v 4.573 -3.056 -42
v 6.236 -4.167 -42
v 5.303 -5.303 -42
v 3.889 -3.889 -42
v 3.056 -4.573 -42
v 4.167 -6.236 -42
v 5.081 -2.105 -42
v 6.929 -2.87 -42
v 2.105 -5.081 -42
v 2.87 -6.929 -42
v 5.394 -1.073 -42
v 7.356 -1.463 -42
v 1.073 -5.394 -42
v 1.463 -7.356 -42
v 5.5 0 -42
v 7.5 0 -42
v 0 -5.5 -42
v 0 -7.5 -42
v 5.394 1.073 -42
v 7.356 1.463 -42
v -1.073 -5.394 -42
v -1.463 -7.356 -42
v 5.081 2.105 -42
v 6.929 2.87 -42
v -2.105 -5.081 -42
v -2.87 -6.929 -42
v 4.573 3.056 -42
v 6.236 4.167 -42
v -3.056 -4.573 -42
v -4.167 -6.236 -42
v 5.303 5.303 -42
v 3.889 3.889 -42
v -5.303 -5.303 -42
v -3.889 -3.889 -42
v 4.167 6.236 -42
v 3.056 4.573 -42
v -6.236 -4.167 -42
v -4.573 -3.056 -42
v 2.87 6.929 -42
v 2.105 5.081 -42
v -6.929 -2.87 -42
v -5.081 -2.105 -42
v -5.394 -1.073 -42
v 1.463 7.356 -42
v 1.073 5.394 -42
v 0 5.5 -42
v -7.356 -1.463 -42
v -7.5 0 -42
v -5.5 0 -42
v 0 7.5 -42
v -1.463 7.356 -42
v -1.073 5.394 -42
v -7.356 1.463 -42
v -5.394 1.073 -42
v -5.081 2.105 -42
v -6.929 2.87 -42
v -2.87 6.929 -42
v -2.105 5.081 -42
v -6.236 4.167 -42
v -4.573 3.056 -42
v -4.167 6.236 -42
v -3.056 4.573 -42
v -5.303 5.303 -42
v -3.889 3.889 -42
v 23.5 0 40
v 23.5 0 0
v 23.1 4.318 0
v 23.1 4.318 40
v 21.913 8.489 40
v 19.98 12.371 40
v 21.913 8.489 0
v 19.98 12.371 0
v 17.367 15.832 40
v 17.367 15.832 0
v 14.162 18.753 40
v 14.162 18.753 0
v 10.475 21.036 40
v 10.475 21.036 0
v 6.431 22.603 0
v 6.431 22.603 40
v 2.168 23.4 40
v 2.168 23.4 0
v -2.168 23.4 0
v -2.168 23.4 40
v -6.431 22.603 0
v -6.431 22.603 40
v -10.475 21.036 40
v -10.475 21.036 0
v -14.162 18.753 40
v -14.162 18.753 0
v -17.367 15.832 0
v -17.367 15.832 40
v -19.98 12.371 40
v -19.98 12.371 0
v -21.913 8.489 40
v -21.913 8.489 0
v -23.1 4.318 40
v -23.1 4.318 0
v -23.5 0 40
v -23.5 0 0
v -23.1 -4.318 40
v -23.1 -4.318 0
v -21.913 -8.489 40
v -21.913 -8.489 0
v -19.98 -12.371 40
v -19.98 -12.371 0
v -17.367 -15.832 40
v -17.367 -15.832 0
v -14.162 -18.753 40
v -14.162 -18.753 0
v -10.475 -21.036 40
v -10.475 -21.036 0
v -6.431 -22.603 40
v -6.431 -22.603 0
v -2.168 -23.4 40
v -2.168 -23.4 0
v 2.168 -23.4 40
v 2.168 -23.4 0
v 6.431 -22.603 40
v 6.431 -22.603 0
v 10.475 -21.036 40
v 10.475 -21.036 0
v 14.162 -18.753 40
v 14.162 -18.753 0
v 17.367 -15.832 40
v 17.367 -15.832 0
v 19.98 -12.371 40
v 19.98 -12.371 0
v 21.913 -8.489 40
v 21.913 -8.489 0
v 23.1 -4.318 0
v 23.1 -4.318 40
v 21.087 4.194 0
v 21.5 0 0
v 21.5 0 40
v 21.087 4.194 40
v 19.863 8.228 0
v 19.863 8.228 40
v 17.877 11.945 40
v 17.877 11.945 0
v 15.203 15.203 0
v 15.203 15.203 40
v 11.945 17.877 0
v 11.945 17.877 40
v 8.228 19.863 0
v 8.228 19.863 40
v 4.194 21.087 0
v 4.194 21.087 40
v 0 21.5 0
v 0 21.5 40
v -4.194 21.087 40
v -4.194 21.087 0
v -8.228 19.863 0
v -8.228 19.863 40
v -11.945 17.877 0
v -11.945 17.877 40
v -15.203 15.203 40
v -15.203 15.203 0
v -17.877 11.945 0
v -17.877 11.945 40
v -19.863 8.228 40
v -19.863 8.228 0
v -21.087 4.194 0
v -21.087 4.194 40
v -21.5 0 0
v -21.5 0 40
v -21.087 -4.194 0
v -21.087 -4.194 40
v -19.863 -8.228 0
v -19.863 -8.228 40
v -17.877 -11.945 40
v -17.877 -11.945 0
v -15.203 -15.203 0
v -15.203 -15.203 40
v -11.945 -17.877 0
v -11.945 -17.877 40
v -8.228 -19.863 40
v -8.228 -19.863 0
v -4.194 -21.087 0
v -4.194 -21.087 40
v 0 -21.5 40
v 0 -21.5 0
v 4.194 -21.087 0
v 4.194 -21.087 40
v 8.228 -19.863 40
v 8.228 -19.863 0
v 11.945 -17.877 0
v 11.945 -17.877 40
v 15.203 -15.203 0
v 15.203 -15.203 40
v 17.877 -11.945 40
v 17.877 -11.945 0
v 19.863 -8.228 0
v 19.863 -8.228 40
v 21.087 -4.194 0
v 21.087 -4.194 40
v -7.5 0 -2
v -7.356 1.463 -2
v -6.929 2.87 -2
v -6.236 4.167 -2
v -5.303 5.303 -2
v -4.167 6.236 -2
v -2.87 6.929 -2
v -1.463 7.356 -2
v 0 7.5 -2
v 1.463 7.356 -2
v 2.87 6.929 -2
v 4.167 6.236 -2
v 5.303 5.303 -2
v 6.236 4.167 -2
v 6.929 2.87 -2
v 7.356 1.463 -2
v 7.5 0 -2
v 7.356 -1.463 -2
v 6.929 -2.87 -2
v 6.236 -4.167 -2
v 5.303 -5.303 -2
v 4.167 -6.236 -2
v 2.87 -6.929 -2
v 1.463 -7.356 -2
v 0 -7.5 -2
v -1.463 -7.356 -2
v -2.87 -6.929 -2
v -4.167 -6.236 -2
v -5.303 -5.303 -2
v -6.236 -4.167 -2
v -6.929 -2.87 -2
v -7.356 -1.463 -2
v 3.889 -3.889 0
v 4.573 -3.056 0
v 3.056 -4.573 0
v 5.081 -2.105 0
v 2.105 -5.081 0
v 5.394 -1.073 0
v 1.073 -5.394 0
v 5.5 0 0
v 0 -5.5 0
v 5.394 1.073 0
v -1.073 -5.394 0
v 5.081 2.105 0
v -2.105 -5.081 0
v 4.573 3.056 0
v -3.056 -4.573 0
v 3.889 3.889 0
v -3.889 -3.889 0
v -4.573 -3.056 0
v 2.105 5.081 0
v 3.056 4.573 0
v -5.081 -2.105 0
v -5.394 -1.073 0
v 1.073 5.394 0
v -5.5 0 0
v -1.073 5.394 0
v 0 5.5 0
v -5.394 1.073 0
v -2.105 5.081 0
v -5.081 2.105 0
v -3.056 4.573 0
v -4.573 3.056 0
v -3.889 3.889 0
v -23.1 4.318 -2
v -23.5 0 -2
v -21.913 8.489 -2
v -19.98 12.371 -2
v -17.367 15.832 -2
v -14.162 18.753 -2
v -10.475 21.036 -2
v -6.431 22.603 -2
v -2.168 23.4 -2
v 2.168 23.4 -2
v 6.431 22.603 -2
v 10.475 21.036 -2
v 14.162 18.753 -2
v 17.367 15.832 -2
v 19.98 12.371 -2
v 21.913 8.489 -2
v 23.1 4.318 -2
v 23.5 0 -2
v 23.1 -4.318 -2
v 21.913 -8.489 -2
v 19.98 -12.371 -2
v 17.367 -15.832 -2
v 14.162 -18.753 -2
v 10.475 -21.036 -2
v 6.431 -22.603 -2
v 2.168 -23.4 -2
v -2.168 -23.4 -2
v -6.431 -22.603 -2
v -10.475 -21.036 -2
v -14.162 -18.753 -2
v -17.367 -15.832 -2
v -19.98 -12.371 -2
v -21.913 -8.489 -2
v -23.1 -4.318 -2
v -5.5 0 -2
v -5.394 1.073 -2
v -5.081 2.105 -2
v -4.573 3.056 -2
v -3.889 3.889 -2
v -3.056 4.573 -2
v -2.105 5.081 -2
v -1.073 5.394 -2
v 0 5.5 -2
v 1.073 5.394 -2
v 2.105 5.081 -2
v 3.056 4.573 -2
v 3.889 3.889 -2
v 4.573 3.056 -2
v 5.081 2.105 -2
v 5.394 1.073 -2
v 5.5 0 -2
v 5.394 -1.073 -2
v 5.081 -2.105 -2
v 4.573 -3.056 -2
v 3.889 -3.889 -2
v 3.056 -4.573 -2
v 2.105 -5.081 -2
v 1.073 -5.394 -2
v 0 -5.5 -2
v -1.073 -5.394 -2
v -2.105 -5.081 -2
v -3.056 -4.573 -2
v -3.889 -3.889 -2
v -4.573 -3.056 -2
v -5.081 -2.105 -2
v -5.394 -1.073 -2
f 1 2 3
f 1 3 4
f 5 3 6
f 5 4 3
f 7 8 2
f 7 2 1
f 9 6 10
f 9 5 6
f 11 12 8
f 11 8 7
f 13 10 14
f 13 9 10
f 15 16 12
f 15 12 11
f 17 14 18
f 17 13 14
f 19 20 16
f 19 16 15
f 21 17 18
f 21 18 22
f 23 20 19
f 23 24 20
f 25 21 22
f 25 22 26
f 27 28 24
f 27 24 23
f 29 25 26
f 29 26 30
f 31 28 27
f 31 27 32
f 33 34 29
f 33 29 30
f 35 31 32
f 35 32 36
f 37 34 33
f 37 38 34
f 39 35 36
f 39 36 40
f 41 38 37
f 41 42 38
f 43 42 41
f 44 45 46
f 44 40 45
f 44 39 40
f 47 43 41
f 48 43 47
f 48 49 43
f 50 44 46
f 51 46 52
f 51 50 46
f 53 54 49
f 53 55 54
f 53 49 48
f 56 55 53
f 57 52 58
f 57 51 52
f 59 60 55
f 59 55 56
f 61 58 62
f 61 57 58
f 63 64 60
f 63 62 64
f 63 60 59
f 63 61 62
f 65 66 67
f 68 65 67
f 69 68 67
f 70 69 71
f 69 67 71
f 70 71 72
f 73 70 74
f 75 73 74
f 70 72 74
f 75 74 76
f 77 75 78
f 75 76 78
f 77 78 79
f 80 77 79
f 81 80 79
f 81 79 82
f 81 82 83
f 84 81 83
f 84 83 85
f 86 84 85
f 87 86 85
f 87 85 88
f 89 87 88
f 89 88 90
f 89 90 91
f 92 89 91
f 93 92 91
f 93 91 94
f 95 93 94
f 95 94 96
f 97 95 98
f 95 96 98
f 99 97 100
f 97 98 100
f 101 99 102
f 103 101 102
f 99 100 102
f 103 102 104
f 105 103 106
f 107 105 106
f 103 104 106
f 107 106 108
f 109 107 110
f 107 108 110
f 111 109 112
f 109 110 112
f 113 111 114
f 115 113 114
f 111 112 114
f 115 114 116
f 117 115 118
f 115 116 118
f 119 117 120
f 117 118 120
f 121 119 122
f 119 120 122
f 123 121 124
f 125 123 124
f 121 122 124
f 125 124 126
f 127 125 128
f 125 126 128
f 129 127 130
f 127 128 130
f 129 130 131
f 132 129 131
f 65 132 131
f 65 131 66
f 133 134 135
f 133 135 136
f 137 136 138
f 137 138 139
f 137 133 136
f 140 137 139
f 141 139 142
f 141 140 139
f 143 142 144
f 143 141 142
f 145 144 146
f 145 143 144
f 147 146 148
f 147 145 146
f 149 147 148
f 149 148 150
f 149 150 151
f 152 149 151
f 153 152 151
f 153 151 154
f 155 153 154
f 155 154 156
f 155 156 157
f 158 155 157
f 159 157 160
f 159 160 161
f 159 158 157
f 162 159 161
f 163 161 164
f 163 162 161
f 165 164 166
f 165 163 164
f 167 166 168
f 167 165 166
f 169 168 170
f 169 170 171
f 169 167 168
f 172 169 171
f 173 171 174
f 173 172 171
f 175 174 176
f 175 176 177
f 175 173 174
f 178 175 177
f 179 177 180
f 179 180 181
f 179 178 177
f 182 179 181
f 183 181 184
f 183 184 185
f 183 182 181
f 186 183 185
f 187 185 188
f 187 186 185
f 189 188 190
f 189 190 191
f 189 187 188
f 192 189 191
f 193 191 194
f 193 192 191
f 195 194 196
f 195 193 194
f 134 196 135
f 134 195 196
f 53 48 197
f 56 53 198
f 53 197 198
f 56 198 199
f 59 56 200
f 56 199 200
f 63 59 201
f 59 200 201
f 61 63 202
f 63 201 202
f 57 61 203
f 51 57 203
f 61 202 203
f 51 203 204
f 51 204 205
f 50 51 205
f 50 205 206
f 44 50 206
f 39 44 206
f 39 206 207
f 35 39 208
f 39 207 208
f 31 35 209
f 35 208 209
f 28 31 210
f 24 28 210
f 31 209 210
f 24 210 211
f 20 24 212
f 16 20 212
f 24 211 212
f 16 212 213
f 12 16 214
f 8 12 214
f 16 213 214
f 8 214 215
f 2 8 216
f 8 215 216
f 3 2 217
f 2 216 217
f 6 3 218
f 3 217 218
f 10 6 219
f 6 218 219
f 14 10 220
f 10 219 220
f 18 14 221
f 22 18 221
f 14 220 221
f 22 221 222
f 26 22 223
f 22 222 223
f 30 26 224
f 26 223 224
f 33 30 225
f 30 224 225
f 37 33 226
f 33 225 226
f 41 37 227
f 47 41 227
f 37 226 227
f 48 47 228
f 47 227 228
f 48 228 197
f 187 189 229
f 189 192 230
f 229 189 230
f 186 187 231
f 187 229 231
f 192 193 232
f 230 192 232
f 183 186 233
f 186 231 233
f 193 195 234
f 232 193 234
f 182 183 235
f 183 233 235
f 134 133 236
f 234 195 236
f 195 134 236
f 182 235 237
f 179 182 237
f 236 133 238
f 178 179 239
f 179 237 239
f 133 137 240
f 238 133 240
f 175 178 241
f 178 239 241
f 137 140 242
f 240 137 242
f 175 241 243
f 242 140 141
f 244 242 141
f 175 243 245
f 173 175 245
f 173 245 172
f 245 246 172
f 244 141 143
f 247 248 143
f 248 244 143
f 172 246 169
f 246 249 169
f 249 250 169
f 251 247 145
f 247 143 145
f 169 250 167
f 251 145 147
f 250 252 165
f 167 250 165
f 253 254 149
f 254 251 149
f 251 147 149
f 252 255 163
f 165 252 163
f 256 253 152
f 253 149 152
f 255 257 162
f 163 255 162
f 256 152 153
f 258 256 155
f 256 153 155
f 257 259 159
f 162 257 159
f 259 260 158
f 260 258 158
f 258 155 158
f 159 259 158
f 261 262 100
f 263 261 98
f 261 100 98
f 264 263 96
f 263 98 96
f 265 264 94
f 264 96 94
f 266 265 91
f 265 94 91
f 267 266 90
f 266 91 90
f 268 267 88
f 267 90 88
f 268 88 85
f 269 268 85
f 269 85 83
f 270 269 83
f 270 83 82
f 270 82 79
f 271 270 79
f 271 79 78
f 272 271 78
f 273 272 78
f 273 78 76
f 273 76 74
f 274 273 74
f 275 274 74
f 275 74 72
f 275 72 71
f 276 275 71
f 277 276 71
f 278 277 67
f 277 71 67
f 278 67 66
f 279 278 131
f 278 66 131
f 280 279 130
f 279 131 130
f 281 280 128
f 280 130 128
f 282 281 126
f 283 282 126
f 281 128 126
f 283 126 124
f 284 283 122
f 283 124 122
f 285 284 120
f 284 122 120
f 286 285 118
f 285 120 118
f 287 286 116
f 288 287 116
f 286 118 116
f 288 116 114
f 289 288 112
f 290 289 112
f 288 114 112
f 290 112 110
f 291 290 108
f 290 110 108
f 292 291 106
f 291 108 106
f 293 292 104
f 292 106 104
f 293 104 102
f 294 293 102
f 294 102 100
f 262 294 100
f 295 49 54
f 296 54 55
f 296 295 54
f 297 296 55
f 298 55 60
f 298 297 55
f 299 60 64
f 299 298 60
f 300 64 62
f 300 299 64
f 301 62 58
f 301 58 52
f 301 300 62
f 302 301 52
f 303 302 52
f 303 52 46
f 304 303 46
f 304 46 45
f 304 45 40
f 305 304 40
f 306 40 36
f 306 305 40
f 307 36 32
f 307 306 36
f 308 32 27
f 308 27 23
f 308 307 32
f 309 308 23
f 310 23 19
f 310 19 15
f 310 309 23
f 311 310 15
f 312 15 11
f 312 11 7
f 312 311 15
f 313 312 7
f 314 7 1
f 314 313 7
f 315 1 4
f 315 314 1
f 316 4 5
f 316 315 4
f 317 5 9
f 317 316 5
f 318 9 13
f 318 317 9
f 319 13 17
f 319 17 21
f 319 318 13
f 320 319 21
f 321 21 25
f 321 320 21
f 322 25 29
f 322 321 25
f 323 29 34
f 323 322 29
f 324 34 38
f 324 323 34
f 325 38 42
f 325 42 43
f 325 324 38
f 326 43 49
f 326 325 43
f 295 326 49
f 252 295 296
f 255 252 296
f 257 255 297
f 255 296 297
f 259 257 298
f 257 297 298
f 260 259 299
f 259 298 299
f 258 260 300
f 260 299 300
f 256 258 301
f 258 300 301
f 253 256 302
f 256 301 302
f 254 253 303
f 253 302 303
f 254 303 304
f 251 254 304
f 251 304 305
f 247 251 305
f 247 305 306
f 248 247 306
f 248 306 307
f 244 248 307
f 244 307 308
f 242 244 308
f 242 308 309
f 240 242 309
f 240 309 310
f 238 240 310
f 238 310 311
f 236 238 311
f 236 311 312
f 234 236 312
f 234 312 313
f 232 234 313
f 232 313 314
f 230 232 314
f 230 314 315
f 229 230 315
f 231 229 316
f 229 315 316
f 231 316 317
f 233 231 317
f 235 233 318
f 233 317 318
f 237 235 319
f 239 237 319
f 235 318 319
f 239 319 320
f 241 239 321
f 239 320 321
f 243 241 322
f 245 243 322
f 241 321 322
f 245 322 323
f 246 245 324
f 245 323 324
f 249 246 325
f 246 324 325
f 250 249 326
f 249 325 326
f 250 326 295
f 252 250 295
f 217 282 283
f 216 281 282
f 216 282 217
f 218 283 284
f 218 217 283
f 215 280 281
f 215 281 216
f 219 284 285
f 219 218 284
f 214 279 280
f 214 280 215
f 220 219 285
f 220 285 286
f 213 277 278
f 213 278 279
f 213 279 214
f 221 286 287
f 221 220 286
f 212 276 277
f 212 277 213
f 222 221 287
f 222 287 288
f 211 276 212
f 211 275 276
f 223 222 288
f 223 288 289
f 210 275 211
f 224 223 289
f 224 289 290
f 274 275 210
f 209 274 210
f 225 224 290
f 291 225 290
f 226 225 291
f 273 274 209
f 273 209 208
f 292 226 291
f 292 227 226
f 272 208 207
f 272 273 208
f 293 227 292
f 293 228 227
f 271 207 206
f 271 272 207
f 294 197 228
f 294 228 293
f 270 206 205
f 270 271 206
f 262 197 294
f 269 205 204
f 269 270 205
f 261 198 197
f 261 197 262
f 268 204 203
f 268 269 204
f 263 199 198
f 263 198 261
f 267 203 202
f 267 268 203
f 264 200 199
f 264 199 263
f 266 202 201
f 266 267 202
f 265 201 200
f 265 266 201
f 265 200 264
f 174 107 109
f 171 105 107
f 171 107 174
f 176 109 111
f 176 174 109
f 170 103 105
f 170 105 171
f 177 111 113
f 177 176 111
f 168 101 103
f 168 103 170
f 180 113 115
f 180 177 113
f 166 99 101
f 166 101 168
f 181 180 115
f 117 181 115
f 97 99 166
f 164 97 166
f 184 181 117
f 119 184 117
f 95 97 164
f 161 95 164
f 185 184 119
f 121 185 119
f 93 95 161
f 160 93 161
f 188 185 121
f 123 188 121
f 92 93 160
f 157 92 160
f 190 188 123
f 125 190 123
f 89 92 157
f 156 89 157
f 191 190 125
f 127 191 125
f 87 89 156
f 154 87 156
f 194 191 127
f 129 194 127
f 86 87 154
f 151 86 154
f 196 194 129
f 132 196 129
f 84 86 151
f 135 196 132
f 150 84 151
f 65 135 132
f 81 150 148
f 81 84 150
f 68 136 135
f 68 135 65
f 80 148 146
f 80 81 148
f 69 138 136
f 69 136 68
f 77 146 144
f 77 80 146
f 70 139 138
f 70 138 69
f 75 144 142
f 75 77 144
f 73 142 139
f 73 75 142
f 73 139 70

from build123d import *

# Parameters (mm, degrees)
SKETCH1_R               = 23.5
SKETCH1_R_2             = 21.5
BOSS_EXTRUDE1_DEPTH     = 40
SKETCH3_R               = 23.5
BOSS_EXTRUDE4_DEPTH     = 2
SKETCH4_R               = 7.5
SKETCH4_R_2             = 5.5
BOSS_EXTRUDE5_DEPTH     = 40
SKETCH5_R               = 5.5
CUT_EXTRUDE1_DEPTH      = 41
CUT_EXTRUDE1_DEPTH_BACK = 43


with BuildPart() as part:
    # Sketch1 → Boss-Extrude1 (new body)
    with BuildSketch(Plane.XY):
        Circle(SKETCH1_R)
        Circle(SKETCH1_R_2, mode=Mode.SUBTRACT)
    extrude(amount=BOSS_EXTRUDE1_DEPTH)

    # Sketch3 → Boss-Extrude4 (add)
    with BuildSketch(Plane(origin=(0, 0, 0), x_dir=(-1, 0, 0), z_dir=(0, 0, -1))):
        Circle(SKETCH3_R)
    extrude(amount=BOSS_EXTRUDE4_DEPTH)

    # Sketch4 → Boss-Extrude5 (add)
    with BuildSketch(Plane(origin=(0, 0, -2), x_dir=(-1, 0, 0), z_dir=(0, 0, -1))):
        Circle(SKETCH4_R)
        Circle(SKETCH4_R_2, mode=Mode.SUBTRACT)
    extrude(amount=BOSS_EXTRUDE5_DEPTH)

    # Sketch5 → Cut-Extrude1 (cut, two sides)
    with BuildSketch(Plane(origin=(0, 0, -2), x_dir=(-1, 0, 0), z_dir=(0, 0, -1))) as cut_extrude1_sk:
        Circle(SKETCH5_R)
    extrude(amount=CUT_EXTRUDE1_DEPTH, mode=Mode.SUBTRACT)
    extrude(cut_extrude1_sk.sketch, amount=-CUT_EXTRUDE1_DEPTH_BACK, mode=Mode.SUBTRACT)


solid = part.part
